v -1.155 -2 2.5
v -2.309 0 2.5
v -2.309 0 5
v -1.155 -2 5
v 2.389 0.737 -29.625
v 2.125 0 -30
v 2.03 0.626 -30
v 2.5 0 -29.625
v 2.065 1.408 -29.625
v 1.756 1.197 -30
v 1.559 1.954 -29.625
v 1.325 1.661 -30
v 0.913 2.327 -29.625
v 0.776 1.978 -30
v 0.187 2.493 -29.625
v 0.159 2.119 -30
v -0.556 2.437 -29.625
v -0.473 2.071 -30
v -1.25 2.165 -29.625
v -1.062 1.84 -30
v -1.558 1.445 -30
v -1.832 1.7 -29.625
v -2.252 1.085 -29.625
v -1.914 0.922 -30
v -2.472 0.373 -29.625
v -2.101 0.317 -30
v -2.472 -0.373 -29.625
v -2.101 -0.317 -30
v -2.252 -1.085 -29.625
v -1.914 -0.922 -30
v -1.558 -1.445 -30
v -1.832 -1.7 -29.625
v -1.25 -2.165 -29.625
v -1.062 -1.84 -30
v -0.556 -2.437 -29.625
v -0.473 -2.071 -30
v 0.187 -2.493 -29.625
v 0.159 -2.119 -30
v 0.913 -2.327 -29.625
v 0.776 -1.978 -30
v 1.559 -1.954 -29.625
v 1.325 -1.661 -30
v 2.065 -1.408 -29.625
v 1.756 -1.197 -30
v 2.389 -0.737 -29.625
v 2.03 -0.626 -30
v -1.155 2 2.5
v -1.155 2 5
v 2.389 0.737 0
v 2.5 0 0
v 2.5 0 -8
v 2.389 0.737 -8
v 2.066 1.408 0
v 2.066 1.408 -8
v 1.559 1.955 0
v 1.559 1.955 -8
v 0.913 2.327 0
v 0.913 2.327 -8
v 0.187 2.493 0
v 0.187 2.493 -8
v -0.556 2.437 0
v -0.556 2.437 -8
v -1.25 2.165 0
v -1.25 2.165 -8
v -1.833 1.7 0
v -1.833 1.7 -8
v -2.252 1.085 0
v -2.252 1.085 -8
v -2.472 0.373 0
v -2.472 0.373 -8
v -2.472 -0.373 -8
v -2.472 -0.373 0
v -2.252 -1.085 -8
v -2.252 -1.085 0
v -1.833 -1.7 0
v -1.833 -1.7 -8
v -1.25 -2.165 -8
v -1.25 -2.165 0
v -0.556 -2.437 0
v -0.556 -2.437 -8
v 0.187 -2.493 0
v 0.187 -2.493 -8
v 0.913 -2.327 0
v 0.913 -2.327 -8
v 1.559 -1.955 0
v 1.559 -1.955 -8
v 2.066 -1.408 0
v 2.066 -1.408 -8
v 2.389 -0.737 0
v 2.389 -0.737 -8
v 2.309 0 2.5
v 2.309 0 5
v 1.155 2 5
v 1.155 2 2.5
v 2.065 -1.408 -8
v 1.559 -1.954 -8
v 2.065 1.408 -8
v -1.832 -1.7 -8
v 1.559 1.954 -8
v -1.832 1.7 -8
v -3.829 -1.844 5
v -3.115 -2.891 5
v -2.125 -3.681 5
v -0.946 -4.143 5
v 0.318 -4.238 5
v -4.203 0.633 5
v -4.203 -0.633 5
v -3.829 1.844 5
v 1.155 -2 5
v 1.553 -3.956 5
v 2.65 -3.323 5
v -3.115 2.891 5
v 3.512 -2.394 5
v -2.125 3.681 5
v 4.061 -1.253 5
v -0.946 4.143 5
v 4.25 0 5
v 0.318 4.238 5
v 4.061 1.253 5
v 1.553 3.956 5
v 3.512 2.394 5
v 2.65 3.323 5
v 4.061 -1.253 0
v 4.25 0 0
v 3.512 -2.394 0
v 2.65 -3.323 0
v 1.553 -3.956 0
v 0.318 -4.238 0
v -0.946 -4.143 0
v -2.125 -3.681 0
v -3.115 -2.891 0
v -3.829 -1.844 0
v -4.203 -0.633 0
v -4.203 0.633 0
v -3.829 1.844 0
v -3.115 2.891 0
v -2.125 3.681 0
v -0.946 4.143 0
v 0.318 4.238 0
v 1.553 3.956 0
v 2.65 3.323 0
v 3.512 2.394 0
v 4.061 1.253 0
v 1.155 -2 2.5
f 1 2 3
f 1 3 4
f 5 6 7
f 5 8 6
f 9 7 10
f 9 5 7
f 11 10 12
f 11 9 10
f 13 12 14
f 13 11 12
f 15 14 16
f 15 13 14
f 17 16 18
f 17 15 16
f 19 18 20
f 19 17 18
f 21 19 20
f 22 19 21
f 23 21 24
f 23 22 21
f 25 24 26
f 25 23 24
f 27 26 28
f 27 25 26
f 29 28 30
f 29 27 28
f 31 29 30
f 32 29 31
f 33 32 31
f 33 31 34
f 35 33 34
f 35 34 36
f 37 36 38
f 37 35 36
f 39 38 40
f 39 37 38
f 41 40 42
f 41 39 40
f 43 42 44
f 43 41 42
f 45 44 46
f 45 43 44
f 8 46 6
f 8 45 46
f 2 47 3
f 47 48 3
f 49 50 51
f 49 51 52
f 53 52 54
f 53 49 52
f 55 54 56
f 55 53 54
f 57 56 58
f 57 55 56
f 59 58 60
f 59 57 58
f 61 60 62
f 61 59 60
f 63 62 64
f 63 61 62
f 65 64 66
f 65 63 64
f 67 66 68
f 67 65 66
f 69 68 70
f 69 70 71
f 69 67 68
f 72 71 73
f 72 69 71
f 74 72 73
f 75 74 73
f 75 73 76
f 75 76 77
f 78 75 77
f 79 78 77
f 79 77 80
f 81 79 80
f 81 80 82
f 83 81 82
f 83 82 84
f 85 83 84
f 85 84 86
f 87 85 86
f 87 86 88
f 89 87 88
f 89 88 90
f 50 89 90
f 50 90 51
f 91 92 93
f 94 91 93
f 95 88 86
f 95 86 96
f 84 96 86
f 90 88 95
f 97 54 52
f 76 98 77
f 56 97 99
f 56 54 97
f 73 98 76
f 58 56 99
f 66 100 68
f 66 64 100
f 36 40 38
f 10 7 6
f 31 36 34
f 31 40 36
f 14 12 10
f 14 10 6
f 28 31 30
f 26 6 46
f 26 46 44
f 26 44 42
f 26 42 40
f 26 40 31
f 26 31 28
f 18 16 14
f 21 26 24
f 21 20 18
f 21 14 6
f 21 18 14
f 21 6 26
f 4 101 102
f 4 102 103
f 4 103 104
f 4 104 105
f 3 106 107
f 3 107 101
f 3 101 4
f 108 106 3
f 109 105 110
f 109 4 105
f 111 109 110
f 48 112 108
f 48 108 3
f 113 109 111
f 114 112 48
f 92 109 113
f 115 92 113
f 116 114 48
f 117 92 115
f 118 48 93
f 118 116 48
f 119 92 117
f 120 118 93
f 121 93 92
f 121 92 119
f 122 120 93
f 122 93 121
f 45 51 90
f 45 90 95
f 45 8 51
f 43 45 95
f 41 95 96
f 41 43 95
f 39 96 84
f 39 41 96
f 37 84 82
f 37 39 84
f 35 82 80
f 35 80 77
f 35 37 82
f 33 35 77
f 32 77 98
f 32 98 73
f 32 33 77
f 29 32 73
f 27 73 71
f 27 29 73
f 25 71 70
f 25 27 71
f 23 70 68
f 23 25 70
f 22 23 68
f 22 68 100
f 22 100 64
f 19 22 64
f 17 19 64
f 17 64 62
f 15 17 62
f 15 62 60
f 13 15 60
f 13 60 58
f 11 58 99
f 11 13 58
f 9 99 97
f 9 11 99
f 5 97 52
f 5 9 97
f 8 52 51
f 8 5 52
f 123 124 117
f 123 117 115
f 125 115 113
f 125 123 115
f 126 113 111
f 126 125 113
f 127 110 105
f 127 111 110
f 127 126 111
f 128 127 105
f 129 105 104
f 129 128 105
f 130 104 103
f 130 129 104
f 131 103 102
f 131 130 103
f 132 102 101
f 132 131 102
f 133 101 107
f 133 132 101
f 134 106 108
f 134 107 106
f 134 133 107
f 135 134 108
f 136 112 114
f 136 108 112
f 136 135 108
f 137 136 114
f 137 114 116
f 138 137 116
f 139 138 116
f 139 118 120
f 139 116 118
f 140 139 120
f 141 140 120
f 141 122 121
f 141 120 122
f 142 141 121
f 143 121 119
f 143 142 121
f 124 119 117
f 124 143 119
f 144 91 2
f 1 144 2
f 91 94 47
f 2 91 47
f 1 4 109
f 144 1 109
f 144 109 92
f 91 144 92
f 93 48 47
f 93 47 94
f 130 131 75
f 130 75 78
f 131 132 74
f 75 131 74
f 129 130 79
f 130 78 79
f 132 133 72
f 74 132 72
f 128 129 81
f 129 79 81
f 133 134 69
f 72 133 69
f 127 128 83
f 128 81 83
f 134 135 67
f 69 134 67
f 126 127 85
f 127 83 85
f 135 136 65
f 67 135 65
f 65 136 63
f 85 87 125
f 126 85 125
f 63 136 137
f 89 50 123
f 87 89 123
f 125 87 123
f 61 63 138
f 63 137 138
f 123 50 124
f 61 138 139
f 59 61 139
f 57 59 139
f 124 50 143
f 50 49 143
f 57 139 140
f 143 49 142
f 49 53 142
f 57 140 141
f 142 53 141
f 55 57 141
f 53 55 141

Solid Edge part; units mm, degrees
sketch "Sketch1" plane through (0, 0, 0) normal (0, 0, 1) x (1, 0, 0)
  circle A0 centre (0, 0) radius 4.25
  dimension "D1" = 8.5
extrude "Protrusion1" add sketch "Sketch1" along normal blind 5
sketch "Sketch2" plane through (0, 0, 0) normal (0, 0, -1) x (1, 0, 0)
  circle A0 centre (0, 0) radius 2.5
extrude "Protrusion2" add sketch "Sketch2" along normal blind 30
sketch "Sketch3" plane through (0, 0, -30) normal (0, 0, -1) x (1, 0, 0)
  circle A0 centre (0, 0) radius 2.4997
extrude "Cutout1" cut sketch "Sketch3" against normal blind 22 flip side to cut
chamfer "Chamfer_1" distance 0.375 angle 45 1 edges at (-2.4997, 0, -30)
sketch "Sketch4" plane through (0, 0, 5) normal (0, 0, 1) x (1, 0, 0)
  line L0 (-1.1547, 2) -> (1.1547, 2)
  line L1 (2.3094, 0) -> (1.1547, 2)
  line L2 (1.1547, -2) -> (2.3094, 0)
  line L3 (-1.1547, -2) -> (1.1547, -2)
  line L4 (-2.3094, 0) -> (-1.1547, -2)
  line L5 (-1.1547, 2) -> (-2.3094, 0)
  dimension "D1" = 4
extrude "Cutout2" cut sketch "Sketch4" against normal blind 2.5
properties part number "185701" material "Stainless Steel, 304"
